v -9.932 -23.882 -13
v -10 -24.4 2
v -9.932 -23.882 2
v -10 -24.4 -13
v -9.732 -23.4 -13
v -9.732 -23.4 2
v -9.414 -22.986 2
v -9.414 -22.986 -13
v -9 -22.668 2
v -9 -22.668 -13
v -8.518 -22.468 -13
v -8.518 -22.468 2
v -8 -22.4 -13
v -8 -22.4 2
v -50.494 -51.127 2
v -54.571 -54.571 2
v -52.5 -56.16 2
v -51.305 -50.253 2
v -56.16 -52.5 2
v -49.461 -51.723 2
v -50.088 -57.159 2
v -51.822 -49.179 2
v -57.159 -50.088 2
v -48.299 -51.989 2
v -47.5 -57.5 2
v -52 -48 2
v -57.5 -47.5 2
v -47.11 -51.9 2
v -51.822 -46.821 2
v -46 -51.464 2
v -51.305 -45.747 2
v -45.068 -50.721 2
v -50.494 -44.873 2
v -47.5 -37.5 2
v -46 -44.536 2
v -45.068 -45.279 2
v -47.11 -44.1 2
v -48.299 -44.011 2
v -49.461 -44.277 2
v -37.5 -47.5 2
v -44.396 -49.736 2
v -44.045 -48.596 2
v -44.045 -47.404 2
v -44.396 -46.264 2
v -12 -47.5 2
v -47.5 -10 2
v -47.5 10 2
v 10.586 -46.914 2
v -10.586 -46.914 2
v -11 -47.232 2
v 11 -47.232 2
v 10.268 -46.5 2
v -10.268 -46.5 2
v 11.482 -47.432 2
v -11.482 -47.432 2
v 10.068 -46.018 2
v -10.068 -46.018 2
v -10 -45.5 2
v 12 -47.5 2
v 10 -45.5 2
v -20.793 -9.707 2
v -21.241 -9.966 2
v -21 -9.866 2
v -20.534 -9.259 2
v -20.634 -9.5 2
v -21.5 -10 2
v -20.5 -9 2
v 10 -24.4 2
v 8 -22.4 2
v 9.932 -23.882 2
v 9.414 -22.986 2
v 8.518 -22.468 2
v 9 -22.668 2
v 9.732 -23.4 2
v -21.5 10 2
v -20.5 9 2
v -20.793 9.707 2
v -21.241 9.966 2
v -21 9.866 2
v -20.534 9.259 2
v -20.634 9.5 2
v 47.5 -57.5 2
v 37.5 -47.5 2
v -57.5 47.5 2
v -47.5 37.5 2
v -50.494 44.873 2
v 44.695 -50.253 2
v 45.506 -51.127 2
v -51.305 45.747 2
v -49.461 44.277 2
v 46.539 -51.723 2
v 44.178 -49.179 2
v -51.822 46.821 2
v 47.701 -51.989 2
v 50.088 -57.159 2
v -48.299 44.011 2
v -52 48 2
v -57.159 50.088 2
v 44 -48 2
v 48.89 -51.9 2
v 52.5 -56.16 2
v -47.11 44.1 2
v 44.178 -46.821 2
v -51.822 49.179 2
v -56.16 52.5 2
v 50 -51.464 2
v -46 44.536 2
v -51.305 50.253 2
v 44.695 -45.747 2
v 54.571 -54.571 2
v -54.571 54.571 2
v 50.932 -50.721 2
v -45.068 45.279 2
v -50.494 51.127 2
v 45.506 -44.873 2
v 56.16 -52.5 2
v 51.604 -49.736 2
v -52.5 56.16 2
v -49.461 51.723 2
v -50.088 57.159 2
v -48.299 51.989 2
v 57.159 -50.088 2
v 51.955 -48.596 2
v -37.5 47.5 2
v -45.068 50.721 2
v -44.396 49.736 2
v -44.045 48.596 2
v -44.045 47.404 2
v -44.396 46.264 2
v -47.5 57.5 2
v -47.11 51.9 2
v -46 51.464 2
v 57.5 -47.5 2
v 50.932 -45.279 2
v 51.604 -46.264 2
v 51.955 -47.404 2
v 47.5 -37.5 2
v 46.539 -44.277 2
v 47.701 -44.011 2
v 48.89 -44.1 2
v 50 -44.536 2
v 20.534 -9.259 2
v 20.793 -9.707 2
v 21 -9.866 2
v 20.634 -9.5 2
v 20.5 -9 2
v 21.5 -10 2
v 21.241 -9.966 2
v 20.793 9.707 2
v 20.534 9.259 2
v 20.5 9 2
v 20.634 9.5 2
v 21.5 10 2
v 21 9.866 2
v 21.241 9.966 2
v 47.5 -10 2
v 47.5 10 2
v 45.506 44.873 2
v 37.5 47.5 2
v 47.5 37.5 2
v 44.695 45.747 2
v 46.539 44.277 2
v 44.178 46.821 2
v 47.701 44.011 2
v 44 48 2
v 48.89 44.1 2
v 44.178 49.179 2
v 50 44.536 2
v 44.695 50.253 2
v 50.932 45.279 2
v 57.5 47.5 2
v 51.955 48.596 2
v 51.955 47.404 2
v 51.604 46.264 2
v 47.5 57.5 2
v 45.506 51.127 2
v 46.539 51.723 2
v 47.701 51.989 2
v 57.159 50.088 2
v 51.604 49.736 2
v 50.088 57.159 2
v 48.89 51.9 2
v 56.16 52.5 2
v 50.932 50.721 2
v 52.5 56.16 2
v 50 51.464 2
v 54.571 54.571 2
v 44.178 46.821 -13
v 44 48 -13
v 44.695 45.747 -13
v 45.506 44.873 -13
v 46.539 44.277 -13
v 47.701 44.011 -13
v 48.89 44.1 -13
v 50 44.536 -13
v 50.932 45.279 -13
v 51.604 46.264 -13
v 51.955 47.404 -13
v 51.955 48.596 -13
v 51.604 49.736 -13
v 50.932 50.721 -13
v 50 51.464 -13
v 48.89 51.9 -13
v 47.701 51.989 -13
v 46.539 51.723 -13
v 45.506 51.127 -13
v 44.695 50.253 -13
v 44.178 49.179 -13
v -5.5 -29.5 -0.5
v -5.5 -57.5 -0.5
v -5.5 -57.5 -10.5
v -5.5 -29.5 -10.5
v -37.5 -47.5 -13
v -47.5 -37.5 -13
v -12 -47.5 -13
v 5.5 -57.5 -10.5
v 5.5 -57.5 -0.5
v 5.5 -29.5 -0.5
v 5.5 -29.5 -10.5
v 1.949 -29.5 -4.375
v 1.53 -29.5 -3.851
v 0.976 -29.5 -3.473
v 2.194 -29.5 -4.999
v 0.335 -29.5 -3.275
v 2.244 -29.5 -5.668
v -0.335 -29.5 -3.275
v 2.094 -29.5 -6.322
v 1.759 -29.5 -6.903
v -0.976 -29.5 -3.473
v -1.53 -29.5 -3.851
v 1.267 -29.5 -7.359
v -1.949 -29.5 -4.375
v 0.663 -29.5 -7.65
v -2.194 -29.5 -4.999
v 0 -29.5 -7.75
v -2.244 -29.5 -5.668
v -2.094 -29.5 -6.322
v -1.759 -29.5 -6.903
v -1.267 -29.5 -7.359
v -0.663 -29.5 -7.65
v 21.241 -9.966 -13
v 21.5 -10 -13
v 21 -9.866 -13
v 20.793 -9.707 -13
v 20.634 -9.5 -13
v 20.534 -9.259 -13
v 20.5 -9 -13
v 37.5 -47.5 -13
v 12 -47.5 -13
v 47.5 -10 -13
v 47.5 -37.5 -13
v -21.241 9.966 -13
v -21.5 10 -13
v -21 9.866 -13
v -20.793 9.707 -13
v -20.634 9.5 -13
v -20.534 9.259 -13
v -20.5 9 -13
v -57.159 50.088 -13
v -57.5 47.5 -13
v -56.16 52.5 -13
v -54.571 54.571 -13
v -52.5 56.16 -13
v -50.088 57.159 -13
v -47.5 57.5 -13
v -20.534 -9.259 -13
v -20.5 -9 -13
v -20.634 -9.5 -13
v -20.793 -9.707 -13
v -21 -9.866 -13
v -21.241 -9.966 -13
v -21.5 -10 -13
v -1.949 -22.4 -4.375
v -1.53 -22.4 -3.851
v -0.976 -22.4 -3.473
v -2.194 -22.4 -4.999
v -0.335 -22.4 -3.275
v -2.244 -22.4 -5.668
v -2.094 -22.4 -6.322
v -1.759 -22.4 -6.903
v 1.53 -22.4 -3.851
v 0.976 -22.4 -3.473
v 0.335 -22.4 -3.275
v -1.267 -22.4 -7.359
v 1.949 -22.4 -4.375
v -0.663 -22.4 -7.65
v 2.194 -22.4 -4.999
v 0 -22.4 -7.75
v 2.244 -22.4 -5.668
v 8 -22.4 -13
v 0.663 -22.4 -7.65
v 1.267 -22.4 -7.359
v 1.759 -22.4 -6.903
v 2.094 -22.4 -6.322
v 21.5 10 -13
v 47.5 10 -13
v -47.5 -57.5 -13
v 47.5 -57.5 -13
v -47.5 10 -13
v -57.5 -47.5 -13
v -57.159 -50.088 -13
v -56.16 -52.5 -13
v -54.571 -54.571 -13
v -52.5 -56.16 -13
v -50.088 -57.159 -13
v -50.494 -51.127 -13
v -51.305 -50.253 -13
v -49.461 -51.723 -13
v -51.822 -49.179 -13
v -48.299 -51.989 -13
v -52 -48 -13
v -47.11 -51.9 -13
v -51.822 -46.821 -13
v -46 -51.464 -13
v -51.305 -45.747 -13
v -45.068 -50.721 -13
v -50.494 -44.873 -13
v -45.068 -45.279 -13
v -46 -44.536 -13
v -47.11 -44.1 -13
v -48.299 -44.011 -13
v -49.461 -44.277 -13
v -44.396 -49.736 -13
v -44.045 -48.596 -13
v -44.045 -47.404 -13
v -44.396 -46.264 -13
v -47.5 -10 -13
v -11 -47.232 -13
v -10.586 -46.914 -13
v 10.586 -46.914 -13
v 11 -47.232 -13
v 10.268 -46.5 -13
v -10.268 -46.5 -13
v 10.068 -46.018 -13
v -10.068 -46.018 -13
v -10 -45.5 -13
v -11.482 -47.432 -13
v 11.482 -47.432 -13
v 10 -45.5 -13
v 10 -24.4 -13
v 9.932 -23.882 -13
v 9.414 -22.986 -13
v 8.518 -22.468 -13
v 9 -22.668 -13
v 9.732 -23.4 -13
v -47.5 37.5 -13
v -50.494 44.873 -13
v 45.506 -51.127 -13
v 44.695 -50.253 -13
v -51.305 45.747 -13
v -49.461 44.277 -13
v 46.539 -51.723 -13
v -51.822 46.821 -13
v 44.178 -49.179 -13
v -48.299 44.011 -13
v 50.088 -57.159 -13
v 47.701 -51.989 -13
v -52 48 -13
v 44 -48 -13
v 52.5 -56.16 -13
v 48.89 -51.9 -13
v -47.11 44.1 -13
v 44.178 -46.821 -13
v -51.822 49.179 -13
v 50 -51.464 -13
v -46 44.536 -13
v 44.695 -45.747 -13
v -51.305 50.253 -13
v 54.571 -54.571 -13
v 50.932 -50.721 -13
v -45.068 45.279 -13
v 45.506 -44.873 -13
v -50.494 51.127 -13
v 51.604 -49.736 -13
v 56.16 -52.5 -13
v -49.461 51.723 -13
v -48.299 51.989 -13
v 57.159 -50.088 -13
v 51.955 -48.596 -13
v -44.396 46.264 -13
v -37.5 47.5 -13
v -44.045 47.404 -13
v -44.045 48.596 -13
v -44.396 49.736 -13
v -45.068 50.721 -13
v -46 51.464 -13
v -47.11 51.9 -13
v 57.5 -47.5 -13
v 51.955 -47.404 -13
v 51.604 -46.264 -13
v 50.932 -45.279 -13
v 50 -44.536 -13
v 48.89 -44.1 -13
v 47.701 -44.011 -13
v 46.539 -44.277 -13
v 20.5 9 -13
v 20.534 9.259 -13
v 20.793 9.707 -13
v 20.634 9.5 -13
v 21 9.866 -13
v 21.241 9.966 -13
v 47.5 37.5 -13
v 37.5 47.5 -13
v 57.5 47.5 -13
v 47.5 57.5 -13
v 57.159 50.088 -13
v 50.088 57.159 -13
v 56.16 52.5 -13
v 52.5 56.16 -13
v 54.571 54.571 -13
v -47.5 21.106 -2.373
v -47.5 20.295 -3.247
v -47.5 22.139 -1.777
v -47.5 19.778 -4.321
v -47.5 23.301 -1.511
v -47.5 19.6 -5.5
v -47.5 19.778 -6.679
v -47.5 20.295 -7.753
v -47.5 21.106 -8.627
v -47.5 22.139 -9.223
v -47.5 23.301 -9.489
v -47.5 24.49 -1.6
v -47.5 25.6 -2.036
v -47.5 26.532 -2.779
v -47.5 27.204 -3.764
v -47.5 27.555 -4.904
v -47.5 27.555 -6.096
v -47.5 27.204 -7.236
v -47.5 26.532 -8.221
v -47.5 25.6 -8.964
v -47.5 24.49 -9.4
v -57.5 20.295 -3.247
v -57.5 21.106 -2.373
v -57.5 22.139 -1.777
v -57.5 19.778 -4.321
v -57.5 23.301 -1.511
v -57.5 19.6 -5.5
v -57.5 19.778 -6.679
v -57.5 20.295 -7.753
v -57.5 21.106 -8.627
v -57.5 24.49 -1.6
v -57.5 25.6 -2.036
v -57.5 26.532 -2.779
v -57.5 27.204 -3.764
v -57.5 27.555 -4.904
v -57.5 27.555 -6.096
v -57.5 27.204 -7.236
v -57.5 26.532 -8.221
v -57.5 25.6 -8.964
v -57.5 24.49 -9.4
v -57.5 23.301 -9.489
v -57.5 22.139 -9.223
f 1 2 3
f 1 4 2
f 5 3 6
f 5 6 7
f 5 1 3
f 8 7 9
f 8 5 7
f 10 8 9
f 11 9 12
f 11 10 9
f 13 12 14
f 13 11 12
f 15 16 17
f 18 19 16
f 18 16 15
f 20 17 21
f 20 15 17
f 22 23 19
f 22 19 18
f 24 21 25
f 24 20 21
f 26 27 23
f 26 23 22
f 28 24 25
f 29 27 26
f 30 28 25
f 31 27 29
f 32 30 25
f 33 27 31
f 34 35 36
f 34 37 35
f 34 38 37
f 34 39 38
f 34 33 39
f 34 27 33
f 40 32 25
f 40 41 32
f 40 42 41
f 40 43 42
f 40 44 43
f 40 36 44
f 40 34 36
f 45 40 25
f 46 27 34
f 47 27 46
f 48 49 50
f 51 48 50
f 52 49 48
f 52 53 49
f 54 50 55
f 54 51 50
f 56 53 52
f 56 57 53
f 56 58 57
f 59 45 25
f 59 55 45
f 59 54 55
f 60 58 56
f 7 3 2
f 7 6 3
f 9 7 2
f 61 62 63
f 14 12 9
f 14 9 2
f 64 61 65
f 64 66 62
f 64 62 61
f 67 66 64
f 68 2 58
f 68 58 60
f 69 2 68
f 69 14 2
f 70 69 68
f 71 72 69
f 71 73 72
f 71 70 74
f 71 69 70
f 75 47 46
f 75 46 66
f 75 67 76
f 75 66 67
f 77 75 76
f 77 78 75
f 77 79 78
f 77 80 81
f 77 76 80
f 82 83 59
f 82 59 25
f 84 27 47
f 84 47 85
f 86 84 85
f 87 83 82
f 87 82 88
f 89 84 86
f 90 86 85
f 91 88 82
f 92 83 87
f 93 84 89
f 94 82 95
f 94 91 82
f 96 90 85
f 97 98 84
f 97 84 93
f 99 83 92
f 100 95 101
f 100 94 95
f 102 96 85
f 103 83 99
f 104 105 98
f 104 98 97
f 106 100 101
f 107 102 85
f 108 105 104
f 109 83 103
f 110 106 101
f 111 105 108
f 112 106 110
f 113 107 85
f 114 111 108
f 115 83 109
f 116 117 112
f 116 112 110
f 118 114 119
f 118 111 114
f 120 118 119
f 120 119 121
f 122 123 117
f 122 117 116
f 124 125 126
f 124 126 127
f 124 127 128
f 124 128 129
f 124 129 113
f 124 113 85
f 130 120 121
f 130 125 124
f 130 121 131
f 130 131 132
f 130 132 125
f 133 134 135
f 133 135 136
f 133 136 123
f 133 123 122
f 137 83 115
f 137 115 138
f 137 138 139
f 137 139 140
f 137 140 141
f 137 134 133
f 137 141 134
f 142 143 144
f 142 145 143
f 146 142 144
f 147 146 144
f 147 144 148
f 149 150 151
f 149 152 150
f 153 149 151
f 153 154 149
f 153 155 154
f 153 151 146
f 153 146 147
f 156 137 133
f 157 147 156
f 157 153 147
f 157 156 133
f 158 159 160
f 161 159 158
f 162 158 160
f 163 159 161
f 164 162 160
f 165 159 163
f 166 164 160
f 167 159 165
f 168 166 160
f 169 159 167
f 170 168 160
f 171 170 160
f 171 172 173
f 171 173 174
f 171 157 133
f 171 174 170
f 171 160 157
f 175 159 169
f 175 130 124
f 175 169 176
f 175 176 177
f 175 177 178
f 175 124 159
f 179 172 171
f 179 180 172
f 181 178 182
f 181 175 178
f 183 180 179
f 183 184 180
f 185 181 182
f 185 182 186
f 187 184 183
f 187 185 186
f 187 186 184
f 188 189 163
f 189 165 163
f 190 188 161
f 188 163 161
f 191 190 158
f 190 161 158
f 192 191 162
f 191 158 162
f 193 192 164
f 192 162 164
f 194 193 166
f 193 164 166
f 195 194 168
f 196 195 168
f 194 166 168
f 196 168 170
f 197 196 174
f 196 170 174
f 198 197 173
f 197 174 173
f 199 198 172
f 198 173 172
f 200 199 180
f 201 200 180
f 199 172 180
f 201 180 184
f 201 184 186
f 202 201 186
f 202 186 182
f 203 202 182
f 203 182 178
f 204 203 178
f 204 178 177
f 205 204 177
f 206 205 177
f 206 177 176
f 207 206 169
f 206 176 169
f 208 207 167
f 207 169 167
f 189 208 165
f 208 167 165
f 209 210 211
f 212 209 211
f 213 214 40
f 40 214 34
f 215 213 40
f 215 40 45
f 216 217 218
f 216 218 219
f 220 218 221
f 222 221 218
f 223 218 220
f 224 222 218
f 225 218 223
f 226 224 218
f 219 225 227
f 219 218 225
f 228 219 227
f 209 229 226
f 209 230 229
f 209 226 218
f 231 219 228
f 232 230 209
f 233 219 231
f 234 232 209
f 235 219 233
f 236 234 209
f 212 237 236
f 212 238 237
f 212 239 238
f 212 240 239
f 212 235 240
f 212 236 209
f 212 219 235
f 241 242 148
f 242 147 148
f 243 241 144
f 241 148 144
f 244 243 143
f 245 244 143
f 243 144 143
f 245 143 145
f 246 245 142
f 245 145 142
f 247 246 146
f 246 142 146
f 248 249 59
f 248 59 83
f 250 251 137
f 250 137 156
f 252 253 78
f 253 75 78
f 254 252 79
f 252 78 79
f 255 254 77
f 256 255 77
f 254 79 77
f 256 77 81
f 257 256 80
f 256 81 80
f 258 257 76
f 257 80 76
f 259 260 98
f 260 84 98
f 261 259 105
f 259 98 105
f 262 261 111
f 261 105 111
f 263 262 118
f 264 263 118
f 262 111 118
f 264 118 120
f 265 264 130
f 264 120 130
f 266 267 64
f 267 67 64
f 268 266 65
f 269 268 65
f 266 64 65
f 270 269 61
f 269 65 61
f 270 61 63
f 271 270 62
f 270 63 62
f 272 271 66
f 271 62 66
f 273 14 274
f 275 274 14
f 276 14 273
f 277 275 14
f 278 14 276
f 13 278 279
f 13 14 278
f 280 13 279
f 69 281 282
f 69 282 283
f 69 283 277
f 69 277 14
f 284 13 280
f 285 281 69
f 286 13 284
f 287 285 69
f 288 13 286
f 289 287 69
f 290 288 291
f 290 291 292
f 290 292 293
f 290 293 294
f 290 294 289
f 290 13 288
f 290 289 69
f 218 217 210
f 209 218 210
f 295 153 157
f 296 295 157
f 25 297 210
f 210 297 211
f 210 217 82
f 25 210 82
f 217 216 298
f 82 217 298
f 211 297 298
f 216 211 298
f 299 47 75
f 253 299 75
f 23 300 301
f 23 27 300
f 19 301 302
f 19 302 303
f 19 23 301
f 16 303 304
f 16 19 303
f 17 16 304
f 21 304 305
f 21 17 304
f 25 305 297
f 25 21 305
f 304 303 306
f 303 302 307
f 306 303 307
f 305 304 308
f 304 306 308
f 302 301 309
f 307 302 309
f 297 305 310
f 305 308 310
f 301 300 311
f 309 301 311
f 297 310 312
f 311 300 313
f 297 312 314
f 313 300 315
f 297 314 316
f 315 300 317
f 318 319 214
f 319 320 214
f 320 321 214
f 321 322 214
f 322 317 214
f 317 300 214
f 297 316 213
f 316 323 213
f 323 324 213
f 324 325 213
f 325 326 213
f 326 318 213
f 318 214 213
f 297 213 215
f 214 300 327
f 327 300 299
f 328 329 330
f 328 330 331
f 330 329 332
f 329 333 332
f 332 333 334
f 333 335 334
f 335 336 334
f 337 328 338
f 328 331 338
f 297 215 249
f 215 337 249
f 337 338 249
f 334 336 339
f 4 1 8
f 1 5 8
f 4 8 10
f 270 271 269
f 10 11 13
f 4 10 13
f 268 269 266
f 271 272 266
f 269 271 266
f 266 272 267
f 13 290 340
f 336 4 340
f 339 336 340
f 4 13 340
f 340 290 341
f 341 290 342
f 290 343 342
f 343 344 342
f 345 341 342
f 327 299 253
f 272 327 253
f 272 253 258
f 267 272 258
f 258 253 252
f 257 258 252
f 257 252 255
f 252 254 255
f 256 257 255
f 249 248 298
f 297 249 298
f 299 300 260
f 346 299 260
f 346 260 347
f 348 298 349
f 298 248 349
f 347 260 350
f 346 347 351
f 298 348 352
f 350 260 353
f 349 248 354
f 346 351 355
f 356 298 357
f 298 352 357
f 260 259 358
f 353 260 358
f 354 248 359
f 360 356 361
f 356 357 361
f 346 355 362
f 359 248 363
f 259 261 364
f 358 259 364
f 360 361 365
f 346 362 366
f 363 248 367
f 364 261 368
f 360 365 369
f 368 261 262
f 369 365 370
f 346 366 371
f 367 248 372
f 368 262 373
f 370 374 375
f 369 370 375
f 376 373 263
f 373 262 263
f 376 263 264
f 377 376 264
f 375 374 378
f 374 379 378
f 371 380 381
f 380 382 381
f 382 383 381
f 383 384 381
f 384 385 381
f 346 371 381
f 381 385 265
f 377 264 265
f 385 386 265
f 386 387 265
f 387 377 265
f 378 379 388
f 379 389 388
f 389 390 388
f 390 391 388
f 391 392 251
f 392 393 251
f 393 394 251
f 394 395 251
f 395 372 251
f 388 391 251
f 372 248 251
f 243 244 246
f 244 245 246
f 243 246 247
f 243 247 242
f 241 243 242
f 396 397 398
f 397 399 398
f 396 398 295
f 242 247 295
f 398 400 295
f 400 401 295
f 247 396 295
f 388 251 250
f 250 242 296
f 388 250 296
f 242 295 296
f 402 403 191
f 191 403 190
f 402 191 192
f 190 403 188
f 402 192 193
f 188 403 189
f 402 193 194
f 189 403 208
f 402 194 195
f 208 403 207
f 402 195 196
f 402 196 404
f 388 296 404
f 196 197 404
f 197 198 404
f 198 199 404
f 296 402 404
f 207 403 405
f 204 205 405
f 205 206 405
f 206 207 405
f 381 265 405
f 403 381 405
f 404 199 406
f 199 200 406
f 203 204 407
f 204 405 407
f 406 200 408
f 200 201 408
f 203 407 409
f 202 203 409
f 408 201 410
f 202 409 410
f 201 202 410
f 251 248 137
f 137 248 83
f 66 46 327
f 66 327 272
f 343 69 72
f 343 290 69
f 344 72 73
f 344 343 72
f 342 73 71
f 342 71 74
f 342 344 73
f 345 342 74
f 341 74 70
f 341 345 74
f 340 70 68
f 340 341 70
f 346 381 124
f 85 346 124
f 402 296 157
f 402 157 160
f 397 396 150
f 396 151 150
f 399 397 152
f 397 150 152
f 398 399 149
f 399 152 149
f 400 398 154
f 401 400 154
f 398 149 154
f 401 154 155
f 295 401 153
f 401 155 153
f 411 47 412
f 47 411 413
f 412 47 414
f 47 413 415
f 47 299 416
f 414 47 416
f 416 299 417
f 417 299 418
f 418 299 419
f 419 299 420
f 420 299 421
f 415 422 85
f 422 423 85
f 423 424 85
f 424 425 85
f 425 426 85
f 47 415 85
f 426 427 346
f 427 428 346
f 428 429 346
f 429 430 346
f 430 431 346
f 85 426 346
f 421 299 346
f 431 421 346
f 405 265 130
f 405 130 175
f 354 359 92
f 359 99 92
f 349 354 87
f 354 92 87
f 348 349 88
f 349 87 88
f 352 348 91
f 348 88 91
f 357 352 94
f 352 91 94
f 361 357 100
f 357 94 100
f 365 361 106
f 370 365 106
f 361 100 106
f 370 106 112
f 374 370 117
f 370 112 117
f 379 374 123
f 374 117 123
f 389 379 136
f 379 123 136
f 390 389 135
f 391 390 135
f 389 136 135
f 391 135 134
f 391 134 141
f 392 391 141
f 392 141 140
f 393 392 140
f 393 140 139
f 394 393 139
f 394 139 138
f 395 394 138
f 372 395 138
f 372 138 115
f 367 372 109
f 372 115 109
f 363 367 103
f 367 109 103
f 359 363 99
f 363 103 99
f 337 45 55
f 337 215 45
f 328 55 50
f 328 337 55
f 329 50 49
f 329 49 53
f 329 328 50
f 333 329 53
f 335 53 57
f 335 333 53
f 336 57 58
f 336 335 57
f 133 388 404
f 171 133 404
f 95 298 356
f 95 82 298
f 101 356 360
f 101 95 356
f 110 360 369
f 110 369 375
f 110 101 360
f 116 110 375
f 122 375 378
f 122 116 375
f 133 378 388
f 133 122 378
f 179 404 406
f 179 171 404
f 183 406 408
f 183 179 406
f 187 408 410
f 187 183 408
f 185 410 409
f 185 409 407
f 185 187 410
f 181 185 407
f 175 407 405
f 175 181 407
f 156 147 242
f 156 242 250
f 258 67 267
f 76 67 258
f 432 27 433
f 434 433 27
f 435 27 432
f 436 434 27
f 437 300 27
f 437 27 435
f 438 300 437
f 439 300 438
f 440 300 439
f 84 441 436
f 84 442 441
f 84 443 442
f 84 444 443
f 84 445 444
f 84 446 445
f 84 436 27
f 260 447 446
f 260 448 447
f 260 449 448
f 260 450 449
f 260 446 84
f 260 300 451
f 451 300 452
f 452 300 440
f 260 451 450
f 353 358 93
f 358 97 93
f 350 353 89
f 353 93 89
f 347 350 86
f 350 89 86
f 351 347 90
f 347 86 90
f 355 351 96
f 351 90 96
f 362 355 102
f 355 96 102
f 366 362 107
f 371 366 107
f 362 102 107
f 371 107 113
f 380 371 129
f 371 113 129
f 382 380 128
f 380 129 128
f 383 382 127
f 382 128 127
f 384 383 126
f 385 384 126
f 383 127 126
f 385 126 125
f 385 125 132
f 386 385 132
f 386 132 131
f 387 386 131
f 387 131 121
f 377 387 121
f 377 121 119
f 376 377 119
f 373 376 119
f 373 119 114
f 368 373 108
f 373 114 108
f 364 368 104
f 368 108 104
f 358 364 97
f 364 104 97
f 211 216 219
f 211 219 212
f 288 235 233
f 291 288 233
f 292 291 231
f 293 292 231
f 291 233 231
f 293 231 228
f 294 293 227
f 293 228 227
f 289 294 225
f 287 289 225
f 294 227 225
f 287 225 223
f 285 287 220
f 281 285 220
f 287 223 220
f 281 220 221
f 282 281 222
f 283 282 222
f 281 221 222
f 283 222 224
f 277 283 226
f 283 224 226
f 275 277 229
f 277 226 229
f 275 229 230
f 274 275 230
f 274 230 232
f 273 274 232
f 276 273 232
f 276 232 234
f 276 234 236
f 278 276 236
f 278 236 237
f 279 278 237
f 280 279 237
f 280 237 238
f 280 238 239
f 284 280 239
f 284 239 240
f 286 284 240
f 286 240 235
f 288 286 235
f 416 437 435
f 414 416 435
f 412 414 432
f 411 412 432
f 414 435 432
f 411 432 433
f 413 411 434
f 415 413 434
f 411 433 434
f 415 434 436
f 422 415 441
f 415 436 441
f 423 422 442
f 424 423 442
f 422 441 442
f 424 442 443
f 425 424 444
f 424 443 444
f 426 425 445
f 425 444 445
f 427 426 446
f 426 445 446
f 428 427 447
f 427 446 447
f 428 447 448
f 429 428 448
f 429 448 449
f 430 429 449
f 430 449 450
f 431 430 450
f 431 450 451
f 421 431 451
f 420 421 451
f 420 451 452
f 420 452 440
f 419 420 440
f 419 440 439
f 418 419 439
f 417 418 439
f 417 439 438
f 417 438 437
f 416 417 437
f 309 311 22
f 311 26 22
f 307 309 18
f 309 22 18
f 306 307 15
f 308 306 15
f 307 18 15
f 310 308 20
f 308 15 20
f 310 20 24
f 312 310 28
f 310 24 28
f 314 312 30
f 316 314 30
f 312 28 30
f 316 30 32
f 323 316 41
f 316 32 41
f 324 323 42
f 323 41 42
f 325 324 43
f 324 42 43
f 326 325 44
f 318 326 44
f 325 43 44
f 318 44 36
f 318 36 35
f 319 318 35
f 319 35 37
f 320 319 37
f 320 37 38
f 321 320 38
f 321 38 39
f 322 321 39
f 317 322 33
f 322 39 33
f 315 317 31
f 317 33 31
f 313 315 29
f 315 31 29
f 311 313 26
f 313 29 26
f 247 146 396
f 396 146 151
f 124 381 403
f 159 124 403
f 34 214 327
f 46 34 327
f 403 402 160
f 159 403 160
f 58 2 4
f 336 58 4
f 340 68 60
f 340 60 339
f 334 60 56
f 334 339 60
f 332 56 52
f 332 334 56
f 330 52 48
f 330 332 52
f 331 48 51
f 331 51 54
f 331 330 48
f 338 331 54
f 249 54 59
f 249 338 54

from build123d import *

# Parameters (mm, degrees)
SKETCH1_W           = 115
SKETCH1_H           = 115
SKETCH1_W_2         = 95
SKETCH1_H_2         = 95
BOSS_EXTRUDE1_DEPTH = 15
SKETCH10_W          = 20
SKETCH10_H          = 15
BOSS_EXTRUDE4_DEPTH = 27
SKETCH3_W           = 11
SKETCH3_H           = 10
CUT_EXTRUDE1_DEPTH  = 28
FILLET1_R           = 10
CHAMFER1_SIZE       = 10
SKETCH4_R           = 4
CUT_EXTRUDE3_DEPTH  = 57.5
SKETCH9_R           = 4
CUT_EXTRUDE7_DEPTH  = 30
FILLET6_R           = 2
SKETCH11_R          = 2.25
CUT_EXTRUDE8_DEPTH  = 30
SKETCH12_W          = 95
SKETCH12_H          = 20
BOSS_EXTRUDE5_DEPTH = 15
SKETCH13_W          = 41
SKETCH13_H          = 27.815570672
CUT_EXTRUDE9_DEPTH  = 20
FILLET7_R           = 1


with BuildPart() as part:
    # Sketch1 → Boss-Extrude1 (new body)
    with BuildSketch(Plane.XY.offset(-13)):
        Rectangle(SKETCH1_W, SKETCH1_H)
        Rectangle(SKETCH1_W_2, SKETCH1_H_2, mode=Mode.SUBTRACT)
    extrude(amount=BOSS_EXTRUDE1_DEPTH)

    # Sketch10 → Boss-Extrude4 (add)
    with BuildSketch(Plane(origin=(0, -22.4, 0), x_dir=(1, 0, 0), z_dir=(0, 1, 0))):
        with Locations((0, 5.5)):
            Rectangle(SKETCH10_W, SKETCH10_H)
    extrude(amount=-BOSS_EXTRUDE4_DEPTH)

    # Sketch3 → Cut-Extrude1 (cut)
    with BuildSketch(Plane(origin=(0, -57.5, 0), x_dir=(-1, 0, 0), z_dir=(0, -1, 0))):
        with Locations((0, 5.5)):
            Rectangle(SKETCH3_W, SKETCH3_H)
    extrude(amount=-CUT_EXTRUDE1_DEPTH, mode=Mode.SUBTRACT)

    # Fillet1
    fillet1_edges = [part.edges().sort_by_distance(p)[0] for p in [
        (-57.5, 57.5, -5.5),
        (57.5, 57.5, -5.5),
        (57.5, -57.5, -5.5),
        (-57.5, -57.5, -5.5),
    ]]
    fillet(fillet1_edges, radius=FILLET1_R)

    # Chamfer1
    chamfer1_edges = [part.edges().sort_by_distance(p)[0] for p in [
        (-47.5, 47.5, -5.5),
        (-47.5, -47.5, -5.5),
        (47.5, -47.5, -5.5),
        (47.5, 47.5, -5.5),
    ]]
    chamfer(chamfer1_edges, length=CHAMFER1_SIZE)

    # Sketch4 → Cut-Extrude3 (cut, symmetric)
    with BuildSketch(Plane.XY):
        with Locations(Location((-48, 48, 0), (0, 0, 180))):
            Circle(SKETCH4_R)
        with Locations(Location((48, 48, 0), (0, 0, 180))):
            Circle(SKETCH4_R)
        with Locations(Location((48, -48, 0), (0, 0, 180))):
            Circle(SKETCH4_R)
        with Locations(Location((-48, -48, 0), (0, 0, 180))):
            Circle(SKETCH4_R)
    extrude(amount=CUT_EXTRUDE3_DEPTH, both=True, mode=Mode.SUBTRACT)

    # Sketch9 → Cut-Extrude7 (cut)
    with BuildSketch(Plane.ZY.offset(57.5)):
        with Locations(Location((-5.5, 23.6, 0), (0, 0, 270))):
            Circle(SKETCH9_R)
    extrude(amount=-CUT_EXTRUDE7_DEPTH, mode=Mode.SUBTRACT)

    # Fillet6
    fillet6_edges = [part.edges().sort_by_distance(p)[0] for p in [
        (10, -47.5, -5.5),
        (-10, -47.5, -5.5),
        (-10, -22.4, -5.5),
        (10, -22.4, -5.5),
    ]]
    fillet(fillet6_edges, radius=FILLET6_R)

    # Sketch11 → Cut-Extrude8 (cut)
    with BuildSketch(Plane(origin=(0, -29.5, 0), x_dir=(-1, 0, 0), z_dir=(0, -1, 0))):
        with Locations(Location((0, 5.5, 0), (0, 0, 90))):
            Circle(SKETCH11_R)
    extrude(amount=-CUT_EXTRUDE8_DEPTH, mode=Mode.SUBTRACT)

    # Sketch12 → Boss-Extrude5 (add)
    with BuildSketch(Plane.XY.offset(2)):
        Rectangle(SKETCH12_W, SKETCH12_H)
    extrude(amount=-BOSS_EXTRUDE5_DEPTH)

    # Sketch13 → Cut-Extrude9 (cut)
    with BuildSketch(Plane.XY.offset(2)):
        Rectangle(SKETCH13_W, SKETCH13_H)
    extrude(amount=-CUT_EXTRUDE9_DEPTH, mode=Mode.SUBTRACT)

    # Fillet7
    fillet7_edges = [part.edges().sort_by_distance(p)[0] for p in [
        (-20.5, -10, -5.5),
        (20.5, -10, -5.5),
        (20.5, 10, -5.5),
        (-20.5, 10, -5.5),
    ]]
    fillet(fillet7_edges, radius=FILLET7_R)


solid = part.part
